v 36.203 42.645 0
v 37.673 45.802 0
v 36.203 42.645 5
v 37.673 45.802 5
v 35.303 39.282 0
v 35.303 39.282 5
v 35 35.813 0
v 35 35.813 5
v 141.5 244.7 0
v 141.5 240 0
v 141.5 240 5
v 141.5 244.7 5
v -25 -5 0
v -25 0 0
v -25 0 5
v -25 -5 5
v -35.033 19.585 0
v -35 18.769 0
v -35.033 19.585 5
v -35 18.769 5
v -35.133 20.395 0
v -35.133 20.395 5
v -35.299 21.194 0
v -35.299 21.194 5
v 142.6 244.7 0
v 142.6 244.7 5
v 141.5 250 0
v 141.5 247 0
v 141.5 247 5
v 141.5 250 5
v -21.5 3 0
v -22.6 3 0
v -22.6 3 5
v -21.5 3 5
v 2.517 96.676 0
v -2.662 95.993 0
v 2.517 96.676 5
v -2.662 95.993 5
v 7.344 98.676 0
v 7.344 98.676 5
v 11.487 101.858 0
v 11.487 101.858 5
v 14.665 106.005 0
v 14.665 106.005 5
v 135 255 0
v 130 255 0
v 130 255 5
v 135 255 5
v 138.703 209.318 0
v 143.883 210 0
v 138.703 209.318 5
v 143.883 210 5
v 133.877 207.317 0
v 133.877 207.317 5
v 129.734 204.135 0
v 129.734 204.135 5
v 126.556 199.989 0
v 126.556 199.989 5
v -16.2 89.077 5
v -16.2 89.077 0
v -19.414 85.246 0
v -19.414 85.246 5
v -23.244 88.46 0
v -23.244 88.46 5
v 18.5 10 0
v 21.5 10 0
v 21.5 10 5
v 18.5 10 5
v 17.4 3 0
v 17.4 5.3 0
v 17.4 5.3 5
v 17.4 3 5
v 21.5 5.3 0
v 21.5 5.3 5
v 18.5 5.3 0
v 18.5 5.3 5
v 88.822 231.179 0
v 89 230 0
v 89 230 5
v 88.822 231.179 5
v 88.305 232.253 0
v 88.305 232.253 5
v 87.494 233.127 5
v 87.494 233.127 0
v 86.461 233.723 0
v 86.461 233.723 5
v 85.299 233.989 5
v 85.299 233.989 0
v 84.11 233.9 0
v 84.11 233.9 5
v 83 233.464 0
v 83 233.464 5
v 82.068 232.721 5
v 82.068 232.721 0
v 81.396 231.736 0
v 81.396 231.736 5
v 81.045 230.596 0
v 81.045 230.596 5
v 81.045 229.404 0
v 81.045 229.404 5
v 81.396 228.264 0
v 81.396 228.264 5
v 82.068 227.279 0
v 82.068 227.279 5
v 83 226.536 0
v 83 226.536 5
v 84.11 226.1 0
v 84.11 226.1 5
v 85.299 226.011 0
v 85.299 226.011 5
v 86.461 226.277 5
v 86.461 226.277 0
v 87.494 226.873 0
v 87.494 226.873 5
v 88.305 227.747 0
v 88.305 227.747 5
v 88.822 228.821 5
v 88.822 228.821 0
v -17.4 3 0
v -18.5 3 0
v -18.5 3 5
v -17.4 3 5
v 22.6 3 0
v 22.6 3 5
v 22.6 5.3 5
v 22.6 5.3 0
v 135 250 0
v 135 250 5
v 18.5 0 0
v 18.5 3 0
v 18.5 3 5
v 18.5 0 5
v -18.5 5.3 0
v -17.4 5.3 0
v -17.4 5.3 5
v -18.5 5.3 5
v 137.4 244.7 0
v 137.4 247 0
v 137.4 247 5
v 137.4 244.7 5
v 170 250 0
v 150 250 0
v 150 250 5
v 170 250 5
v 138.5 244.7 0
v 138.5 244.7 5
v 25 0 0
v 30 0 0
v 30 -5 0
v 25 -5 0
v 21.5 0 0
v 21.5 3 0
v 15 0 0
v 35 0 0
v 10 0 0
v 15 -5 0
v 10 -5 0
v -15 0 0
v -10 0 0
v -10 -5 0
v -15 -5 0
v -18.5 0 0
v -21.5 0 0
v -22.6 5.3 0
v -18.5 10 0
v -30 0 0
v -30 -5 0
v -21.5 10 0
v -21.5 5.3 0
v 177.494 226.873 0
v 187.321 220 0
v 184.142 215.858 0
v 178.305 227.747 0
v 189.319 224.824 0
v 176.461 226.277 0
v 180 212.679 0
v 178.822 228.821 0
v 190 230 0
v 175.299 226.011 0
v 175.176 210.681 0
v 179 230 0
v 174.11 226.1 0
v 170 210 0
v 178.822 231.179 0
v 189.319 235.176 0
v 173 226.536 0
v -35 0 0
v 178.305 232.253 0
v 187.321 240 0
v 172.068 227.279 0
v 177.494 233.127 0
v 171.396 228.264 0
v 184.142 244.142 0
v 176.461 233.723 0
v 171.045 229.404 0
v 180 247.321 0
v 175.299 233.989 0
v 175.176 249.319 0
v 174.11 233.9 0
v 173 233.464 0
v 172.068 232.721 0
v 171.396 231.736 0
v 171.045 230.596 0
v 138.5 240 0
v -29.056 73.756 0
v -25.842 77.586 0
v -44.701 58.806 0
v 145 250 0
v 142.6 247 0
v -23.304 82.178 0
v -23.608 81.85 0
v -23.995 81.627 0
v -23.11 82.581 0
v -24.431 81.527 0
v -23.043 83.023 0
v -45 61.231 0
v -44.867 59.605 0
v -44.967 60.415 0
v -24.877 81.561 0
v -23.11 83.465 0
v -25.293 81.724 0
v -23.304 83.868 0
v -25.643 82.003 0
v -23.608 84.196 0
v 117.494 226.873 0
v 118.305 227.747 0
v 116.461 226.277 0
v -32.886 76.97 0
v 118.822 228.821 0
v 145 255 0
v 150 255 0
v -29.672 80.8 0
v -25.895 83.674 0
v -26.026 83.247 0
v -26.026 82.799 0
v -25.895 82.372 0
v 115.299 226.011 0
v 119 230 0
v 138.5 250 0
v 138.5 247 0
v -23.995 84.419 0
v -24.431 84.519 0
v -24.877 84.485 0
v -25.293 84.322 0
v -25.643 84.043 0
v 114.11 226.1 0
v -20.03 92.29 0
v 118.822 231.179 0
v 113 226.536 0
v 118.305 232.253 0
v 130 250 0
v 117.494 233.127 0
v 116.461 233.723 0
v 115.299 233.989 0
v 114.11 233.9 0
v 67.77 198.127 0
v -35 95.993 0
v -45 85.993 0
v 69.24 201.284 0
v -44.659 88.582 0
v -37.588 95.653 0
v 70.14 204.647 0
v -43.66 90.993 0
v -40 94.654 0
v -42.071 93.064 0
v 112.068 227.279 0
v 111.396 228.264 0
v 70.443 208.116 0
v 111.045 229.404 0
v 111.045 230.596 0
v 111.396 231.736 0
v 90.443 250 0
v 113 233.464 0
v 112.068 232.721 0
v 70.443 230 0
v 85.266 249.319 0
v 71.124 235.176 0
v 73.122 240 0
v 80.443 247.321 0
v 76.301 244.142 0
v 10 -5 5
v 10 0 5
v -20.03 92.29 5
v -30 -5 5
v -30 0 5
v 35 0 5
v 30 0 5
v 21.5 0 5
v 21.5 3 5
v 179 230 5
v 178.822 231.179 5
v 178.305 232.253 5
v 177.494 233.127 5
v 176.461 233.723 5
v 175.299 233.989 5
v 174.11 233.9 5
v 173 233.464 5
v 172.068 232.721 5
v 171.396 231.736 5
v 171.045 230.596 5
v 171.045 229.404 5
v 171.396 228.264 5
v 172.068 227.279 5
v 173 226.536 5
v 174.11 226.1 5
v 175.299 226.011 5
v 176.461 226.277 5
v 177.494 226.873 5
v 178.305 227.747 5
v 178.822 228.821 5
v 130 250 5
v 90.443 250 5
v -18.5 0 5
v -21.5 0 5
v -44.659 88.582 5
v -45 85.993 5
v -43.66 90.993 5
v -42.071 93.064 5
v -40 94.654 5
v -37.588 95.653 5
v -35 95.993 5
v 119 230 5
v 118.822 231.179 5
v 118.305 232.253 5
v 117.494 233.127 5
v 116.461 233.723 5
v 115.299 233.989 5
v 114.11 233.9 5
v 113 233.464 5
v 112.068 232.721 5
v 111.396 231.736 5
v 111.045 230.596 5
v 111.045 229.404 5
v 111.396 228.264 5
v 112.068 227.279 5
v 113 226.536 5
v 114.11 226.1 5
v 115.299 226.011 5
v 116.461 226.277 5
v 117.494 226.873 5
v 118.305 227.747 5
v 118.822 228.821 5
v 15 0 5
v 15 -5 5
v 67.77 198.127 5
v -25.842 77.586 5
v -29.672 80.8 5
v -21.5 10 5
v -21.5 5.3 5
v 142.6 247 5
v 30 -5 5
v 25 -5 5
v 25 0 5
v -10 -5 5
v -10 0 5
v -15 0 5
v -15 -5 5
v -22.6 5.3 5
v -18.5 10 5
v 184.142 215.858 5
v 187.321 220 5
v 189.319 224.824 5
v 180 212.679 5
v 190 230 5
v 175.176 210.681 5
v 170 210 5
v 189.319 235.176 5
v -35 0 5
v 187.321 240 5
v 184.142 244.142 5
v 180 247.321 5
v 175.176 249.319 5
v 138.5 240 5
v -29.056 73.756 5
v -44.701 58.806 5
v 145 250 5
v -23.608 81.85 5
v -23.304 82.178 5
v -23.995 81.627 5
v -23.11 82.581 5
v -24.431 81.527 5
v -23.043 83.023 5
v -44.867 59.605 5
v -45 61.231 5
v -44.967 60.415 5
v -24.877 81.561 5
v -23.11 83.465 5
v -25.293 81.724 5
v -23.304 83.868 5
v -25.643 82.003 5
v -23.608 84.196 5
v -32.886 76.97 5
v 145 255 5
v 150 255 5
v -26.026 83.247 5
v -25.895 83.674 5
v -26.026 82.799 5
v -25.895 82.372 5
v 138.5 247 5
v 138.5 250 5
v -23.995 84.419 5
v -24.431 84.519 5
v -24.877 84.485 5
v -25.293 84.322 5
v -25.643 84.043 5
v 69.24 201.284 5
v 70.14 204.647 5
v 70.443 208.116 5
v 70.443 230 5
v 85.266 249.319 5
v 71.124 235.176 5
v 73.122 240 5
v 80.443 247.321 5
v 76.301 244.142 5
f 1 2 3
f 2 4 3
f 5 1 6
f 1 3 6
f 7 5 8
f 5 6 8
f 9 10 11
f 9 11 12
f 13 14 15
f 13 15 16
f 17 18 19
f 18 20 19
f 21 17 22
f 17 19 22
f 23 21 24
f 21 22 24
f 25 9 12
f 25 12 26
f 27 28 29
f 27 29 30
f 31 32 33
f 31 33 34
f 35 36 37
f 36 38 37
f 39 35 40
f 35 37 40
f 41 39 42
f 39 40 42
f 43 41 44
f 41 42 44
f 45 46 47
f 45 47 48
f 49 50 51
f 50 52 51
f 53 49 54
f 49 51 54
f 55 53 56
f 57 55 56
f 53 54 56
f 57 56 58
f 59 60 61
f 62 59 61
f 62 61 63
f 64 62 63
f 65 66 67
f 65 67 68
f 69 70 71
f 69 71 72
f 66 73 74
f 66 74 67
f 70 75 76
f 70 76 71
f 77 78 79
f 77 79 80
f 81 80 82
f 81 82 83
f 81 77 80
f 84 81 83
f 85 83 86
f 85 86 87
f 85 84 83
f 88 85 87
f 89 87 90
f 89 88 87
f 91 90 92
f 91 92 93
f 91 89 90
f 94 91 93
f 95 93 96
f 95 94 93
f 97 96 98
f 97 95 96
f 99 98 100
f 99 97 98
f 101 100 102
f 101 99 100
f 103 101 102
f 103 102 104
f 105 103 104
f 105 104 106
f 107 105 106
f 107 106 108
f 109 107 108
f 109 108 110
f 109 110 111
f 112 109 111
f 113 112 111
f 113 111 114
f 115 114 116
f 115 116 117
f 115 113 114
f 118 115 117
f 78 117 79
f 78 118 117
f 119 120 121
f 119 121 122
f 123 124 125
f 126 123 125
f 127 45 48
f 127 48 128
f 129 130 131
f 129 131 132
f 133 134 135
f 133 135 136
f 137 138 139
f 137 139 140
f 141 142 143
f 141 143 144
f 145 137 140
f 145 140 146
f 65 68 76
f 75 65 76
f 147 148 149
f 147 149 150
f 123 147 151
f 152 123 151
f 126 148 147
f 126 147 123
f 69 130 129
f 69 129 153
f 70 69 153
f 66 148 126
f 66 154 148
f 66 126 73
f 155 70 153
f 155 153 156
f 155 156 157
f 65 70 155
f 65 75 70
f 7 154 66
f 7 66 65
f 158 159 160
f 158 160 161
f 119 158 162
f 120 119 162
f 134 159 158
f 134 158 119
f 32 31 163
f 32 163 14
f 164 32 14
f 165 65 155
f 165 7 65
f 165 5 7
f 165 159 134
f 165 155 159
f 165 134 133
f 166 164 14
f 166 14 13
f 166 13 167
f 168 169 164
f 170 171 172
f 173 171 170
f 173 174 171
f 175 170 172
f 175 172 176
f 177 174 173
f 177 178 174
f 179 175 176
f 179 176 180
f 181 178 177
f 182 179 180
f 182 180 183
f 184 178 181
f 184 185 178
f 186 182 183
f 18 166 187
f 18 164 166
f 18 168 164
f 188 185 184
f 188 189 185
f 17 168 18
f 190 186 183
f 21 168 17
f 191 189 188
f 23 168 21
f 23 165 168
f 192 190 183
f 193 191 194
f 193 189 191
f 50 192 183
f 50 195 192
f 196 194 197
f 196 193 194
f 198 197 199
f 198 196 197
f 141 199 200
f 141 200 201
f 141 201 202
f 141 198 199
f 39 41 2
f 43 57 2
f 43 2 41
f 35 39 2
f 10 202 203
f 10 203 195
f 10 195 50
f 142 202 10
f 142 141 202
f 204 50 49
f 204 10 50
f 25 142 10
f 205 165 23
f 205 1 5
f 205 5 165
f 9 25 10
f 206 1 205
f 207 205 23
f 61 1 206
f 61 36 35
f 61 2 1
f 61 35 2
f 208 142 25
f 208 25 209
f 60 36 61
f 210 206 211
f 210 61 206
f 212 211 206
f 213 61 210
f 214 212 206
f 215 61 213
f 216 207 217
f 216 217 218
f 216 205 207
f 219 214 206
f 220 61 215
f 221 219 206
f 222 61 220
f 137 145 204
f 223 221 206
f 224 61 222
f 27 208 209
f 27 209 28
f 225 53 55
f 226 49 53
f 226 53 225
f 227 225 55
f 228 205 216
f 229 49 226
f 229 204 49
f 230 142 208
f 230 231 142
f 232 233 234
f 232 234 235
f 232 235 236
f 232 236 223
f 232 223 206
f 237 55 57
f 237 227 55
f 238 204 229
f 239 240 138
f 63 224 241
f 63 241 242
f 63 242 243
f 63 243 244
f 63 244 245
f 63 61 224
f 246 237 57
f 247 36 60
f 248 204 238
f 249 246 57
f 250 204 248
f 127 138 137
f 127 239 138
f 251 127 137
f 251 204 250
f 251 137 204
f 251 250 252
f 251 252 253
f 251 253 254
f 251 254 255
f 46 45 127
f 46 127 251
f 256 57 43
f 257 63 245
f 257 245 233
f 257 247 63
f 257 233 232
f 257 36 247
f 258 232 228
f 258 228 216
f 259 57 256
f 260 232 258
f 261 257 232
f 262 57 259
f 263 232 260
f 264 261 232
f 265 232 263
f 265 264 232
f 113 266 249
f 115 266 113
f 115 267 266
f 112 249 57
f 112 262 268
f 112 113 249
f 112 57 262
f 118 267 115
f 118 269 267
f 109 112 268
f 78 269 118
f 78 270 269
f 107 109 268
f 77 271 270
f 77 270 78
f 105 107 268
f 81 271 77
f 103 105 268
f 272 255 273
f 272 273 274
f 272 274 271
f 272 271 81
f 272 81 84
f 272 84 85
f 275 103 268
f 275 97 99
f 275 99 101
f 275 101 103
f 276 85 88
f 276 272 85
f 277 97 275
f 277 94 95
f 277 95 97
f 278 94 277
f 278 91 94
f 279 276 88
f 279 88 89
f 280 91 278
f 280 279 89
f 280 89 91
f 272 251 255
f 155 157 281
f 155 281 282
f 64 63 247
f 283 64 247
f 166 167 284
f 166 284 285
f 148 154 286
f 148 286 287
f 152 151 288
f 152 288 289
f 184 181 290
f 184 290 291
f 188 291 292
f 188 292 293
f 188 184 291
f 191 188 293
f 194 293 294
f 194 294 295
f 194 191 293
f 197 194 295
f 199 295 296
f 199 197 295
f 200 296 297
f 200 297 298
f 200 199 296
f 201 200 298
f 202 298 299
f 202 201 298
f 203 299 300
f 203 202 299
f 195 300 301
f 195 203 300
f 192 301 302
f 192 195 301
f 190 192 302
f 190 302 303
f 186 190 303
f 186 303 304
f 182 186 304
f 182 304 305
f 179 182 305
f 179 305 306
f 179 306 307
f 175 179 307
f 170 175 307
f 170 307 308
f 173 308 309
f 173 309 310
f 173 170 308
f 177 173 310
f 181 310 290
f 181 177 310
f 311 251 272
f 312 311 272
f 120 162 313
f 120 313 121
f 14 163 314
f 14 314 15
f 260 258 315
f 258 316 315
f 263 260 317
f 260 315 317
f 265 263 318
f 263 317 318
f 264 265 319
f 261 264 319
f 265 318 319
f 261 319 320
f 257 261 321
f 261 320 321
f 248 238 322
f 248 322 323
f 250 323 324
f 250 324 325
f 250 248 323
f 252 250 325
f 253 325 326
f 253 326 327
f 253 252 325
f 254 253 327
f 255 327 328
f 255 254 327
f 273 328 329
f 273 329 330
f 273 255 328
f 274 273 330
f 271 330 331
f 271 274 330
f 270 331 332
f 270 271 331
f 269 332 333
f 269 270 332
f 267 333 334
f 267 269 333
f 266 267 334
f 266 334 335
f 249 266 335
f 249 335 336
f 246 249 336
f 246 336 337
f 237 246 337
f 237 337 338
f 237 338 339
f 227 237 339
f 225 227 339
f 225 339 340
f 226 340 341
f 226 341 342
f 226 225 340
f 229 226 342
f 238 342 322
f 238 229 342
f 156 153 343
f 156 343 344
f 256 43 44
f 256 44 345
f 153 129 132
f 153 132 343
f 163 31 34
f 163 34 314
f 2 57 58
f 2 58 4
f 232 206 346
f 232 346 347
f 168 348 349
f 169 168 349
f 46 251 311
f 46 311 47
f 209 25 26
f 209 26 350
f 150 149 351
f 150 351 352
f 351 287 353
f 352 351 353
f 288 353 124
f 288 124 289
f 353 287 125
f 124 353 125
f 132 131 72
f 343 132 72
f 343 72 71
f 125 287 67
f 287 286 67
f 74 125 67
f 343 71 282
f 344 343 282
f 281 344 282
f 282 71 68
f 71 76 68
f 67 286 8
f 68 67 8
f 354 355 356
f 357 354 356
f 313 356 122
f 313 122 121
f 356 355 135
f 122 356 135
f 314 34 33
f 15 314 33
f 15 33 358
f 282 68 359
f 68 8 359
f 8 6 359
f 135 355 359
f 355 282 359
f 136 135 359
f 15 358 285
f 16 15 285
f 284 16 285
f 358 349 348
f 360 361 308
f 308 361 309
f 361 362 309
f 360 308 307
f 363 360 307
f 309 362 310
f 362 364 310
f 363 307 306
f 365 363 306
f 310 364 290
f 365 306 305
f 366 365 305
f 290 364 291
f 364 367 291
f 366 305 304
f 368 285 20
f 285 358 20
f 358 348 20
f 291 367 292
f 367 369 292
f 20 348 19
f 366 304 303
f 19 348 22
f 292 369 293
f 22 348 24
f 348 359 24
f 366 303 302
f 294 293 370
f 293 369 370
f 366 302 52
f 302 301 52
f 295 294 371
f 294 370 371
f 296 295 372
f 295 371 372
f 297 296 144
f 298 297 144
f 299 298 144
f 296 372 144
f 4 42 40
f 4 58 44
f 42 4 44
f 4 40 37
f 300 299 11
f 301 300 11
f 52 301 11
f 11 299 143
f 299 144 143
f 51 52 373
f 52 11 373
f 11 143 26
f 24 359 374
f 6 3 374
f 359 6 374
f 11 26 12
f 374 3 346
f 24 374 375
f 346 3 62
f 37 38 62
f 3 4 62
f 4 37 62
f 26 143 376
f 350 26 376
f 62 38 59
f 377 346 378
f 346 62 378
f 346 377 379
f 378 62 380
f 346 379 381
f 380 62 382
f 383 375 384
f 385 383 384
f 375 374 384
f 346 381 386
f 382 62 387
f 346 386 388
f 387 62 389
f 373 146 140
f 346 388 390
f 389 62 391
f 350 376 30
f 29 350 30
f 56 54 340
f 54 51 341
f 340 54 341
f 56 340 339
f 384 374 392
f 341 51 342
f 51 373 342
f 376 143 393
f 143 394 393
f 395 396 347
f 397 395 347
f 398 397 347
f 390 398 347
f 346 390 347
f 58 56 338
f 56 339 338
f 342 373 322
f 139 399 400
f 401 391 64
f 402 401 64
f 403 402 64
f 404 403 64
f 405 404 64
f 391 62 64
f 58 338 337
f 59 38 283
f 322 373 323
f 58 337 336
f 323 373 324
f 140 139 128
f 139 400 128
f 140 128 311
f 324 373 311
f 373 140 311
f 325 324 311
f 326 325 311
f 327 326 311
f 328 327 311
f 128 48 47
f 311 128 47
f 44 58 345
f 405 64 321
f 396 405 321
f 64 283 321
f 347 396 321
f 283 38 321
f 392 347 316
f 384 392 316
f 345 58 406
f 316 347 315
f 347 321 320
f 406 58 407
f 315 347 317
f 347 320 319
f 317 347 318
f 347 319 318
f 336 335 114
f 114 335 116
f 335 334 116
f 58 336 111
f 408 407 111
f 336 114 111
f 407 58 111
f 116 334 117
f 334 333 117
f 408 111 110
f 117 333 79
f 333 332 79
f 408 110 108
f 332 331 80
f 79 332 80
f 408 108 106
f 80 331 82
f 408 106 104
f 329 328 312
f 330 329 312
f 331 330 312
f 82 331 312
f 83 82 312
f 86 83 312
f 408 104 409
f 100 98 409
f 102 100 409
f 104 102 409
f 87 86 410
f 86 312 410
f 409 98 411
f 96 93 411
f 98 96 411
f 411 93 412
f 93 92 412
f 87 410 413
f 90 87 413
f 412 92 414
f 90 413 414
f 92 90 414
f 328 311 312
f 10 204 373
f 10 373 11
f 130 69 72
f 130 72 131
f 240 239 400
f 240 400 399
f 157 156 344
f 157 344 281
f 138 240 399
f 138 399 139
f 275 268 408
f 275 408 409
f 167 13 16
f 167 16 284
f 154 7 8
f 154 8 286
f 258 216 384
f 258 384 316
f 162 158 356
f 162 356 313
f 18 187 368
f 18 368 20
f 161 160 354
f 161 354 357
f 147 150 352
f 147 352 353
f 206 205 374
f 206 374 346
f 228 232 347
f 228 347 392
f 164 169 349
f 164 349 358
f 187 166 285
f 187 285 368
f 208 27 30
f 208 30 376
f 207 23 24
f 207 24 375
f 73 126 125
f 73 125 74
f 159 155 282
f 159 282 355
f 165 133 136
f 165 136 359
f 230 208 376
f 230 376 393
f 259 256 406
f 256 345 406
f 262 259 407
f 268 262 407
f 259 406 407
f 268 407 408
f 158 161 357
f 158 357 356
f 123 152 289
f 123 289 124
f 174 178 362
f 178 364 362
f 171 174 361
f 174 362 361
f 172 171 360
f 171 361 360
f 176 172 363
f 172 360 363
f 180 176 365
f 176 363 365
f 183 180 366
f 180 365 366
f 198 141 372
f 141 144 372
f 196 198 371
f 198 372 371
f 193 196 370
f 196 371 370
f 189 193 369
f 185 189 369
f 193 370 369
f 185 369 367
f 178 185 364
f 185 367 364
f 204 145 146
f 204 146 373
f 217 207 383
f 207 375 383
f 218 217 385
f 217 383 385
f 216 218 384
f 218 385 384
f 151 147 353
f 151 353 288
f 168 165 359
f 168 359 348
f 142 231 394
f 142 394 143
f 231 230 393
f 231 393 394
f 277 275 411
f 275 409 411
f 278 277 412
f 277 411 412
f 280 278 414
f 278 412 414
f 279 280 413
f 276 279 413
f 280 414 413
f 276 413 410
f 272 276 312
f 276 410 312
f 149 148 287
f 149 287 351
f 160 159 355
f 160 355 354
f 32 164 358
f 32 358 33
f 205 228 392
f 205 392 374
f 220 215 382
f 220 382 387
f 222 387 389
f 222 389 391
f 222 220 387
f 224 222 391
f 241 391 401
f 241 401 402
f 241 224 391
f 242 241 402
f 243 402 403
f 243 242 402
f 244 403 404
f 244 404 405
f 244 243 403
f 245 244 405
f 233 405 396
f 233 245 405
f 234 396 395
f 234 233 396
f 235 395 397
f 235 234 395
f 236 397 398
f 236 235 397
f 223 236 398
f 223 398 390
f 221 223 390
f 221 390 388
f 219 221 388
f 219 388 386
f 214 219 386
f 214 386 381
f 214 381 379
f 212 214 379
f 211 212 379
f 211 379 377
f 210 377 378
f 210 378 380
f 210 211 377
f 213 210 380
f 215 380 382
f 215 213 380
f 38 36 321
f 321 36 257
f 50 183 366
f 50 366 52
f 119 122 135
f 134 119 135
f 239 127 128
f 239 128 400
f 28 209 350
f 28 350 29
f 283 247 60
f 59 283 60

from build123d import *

# Parameters (mm, degrees)
ESQUISSE1_R        = 4
ESQUISSE1_R_2      = 1.5
BOSS_EXTRU_1_DEPTH = 5
CONG_1_R           = 10
CONG_2_R           = 20


with BuildPart() as part:
    # Esquisse1 → Boss.-Extru.1 (new body)
    with BuildSketch(Plane.XY):
        Polygon((-21.5, 0), (-25, 0), (-25, -5), (-30, -5), (-30, 0), (-35, 0), (-35, 20), (-45, 60), (-45, 95.993420768), (-35, 95.993420768), (-10, 95.993420768), (8.893717408, 95.993420768), (70.442895342, 202.763784424), (70.442895342, 250), (97.672831982, 250), (130, 250), (130, 255), (135, 255), (135, 250), (138.5, 250), (138.5, 247), (137.4, 247), (137.4, 244.7), (138.5, 244.7), (138.5, 240), (141.5, 240), (141.5, 244.7), (142.6, 244.7), (142.6, 247), (141.5, 247), (141.5, 250), (145, 250), (145, 255), (150, 255), (150, 250), (190, 250), (190, 210), (132.327168018, 210), (35, 41.164972924), (35, 0), (30, 0), (30, -5), (25, -5), (25, 0), (21.5, 0), (21.5, 3), (22.6, 3), (22.6, 5.3), (21.5, 5.3), (21.5, 10), (18.5, 10), (18.5, 5.3), (17.4, 5.3), (17.4, 3), (18.5, 3), (18.5, 0), (15, 0), (15, -5), (10, -5), (10, 0), (-10, 0), (-10, -5), (-15, -5), (-15, 0), (-18.5, 0), (-18.5, 3), (-17.4, 3), (-17.4, 5.3), (-18.5, 5.3), (-18.5, 10), (-21.5, 10), (-21.5, 5.3), (-22.6, 5.3), (-22.6, 3), (-21.5, 3), align=None)
        with Locations((115, 230)):
            Circle(ESQUISSE1_R, mode=Mode.SUBTRACT)
        with Locations((175, 230)):
            Circle(ESQUISSE1_R, mode=Mode.SUBTRACT)
        with Locations((85, 230)):
            Circle(ESQUISSE1_R, mode=Mode.SUBTRACT)
        with Locations((-24.543125869, 83.023041686)):
            Circle(ESQUISSE1_R_2, mode=Mode.SUBTRACT)
        Polygon((-29.672175025, 80.799788495), (-32.886113073, 76.969566279), (-29.055890858, 73.755628231), (-25.841952809, 77.585850447), align=None, mode=Mode.SUBTRACT)
        Polygon((-23.244298928, 88.460232926), (-20.03036088, 92.290455142), (-16.200138664, 89.076517093), (-19.414076712, 85.246294878), align=None, mode=Mode.SUBTRACT)
    extrude(amount=BOSS_EXTRU_1_DEPTH)

    # Congé1
    cong_1_edges = [part.edges().sort_by_distance(p)[0] for p in [
        (-35, 20, 2.5),
        (-45, 60, 2.5),
        (-45, 95.993420768, 2.5),
    ]]
    fillet(cong_1_edges, radius=CONG_1_R)

    # Congé2
    cong_2_edges = [part.edges().sort_by_distance(p)[0] for p in [
        (35, 41.164972924, 2.5),
        (132.327168018, 210, 2.5),
        (190, 210, 2.5),
        (70.442895342, 250, 2.5),
        (190, 250, 2.5),
        (8.893717408, 95.993420768, 2.5),
        (70.442895342, 202.763784424, 2.5),
    ]]
    fillet(cong_2_edges, radius=CONG_2_R - 0.0001)  # a hair under: the kernel refuses the full size


solid = part.part
